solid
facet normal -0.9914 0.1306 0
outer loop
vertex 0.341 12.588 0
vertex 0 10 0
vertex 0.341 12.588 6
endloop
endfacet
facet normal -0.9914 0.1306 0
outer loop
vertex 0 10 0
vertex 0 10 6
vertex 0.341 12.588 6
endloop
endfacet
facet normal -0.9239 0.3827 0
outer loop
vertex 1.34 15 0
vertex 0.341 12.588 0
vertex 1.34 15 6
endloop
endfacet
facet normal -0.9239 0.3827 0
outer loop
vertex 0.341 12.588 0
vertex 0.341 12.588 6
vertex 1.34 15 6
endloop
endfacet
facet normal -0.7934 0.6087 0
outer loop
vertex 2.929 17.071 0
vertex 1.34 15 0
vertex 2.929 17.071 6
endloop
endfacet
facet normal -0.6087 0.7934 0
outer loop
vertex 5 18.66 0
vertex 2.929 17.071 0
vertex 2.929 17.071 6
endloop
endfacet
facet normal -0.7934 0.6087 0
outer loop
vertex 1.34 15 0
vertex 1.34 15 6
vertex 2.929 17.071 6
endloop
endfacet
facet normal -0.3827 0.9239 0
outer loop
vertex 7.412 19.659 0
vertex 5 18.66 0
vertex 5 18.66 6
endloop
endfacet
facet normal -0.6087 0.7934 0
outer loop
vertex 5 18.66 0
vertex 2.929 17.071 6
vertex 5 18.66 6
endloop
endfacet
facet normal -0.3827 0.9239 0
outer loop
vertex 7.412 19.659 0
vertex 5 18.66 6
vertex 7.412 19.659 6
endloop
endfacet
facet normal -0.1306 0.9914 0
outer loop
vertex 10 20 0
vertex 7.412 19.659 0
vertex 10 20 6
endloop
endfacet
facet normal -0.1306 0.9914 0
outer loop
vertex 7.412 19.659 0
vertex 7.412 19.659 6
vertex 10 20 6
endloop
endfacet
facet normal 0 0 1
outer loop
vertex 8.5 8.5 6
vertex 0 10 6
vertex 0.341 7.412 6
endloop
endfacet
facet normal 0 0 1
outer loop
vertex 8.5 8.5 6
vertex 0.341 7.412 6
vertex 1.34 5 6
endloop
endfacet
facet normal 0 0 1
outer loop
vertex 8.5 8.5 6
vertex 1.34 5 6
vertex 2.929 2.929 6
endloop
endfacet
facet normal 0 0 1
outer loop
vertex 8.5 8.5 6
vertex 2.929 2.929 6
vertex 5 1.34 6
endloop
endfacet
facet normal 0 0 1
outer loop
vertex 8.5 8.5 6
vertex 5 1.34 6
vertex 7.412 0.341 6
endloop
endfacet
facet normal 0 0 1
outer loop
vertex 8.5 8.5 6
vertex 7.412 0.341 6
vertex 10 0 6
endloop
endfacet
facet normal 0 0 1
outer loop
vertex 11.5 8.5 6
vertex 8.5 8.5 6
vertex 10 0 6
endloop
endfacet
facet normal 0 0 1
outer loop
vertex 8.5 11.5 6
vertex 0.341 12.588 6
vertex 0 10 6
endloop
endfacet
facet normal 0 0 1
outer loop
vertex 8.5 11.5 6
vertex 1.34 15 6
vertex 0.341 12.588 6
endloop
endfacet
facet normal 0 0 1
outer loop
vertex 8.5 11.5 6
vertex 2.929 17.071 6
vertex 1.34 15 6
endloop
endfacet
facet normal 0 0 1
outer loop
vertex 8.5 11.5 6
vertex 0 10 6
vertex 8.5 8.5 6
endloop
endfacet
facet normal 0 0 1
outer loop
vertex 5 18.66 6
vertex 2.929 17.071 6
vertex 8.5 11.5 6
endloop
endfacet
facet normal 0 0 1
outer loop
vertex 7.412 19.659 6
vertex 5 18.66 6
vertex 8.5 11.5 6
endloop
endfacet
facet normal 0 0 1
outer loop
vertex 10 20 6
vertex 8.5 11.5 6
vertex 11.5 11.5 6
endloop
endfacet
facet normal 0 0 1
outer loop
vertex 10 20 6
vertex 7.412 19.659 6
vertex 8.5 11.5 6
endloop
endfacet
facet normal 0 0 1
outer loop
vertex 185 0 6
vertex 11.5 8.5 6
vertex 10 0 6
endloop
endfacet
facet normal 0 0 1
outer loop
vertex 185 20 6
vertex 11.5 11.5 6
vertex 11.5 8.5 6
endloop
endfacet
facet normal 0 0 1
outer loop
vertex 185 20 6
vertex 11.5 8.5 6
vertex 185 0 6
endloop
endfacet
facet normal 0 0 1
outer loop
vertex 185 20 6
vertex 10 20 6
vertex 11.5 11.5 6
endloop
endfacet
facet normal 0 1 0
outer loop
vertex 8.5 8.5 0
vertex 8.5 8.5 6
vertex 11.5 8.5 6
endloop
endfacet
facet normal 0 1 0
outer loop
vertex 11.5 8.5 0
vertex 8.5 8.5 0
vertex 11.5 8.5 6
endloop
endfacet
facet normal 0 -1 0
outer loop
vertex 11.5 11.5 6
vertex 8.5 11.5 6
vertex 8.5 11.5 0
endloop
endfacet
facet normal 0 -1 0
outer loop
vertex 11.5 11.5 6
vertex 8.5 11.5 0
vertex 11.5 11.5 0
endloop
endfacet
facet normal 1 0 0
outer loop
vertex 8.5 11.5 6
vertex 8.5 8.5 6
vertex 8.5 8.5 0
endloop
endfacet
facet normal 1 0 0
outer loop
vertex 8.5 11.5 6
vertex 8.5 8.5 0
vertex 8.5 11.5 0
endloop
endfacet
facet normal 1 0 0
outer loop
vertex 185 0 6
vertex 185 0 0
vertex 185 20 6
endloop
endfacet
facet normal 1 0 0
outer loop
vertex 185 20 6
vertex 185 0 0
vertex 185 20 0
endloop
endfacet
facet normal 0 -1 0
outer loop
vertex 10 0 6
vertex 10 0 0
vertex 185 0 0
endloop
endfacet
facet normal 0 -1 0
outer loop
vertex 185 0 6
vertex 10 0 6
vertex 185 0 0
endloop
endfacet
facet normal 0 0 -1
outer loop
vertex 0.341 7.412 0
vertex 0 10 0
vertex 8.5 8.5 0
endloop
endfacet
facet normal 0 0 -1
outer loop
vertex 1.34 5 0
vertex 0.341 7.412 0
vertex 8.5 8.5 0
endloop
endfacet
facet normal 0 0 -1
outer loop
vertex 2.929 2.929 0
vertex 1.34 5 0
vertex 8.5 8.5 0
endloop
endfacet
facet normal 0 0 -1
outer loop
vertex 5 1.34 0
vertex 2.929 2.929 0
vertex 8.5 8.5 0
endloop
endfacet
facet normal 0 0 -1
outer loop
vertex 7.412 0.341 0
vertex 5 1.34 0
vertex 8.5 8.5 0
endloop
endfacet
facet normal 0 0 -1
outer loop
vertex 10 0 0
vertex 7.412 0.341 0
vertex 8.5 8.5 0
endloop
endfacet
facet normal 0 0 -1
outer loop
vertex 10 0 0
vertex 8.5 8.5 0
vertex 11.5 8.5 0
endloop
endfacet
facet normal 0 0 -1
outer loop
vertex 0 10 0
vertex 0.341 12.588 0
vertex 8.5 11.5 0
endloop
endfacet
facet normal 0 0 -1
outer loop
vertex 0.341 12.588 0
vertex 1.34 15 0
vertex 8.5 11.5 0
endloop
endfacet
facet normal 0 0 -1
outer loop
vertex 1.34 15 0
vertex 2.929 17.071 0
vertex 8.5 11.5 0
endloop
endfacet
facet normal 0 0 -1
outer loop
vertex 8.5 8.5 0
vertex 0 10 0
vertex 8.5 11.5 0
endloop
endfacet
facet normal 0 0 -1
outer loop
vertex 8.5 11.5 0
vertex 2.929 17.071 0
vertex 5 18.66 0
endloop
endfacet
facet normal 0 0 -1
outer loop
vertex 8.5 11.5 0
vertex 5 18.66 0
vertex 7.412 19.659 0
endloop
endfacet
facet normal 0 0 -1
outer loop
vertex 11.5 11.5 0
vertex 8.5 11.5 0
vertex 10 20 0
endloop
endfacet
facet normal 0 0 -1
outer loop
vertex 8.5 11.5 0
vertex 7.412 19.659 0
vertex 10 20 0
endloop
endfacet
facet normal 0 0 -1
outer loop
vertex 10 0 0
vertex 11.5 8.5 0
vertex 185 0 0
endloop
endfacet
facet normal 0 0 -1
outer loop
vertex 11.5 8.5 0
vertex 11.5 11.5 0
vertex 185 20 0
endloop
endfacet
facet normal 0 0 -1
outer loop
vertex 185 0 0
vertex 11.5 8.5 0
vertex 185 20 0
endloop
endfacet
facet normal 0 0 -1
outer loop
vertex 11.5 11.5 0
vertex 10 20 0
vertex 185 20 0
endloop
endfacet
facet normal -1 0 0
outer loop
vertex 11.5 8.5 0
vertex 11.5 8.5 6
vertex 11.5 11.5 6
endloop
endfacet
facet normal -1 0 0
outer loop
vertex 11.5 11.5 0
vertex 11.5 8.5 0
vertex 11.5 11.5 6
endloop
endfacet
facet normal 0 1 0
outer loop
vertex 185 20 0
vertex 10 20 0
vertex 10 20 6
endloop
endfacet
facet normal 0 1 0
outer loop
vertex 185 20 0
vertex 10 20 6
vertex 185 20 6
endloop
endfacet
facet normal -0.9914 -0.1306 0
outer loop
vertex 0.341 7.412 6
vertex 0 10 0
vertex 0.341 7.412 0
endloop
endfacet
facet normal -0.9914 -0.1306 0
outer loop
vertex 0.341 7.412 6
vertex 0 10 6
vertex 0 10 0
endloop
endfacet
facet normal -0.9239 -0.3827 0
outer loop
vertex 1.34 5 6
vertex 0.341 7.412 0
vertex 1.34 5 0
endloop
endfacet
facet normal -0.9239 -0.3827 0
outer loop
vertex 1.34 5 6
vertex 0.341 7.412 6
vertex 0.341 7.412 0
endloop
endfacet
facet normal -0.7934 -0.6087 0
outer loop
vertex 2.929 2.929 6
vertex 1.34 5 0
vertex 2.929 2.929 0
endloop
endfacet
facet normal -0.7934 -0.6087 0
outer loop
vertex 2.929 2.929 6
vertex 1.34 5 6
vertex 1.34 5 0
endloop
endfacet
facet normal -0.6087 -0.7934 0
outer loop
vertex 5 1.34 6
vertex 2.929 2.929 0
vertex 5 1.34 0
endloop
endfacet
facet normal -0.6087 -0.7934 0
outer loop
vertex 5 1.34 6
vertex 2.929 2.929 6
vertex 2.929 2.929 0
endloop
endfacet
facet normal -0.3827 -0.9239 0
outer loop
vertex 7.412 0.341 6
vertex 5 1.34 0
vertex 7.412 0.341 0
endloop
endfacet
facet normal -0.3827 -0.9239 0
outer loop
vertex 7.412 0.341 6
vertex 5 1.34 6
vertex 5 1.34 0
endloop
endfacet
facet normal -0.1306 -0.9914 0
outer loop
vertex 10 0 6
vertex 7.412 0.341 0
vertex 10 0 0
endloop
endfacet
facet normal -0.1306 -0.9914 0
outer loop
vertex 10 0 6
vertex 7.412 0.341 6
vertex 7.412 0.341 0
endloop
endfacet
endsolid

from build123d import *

# Parameters (mm, degrees)
SKETCH1_W           = 185
SKETCH1_H           = 20
BOSS_EXTRUDE1_DEPTH = 6
SKETCH2_W           = 3
SKETCH2_H           = 3
CUT_EXTRUDE2_DEPTH  = 187.174649187
FILLET1_R           = 10


with BuildPart() as part:
    # Sketch1 → Boss-Extrude1 (new body)
    with BuildSketch(Plane.XY):
        with Locations((92.5, 10)):
            Rectangle(SKETCH1_W, SKETCH1_H)
    extrude(amount=BOSS_EXTRUDE1_DEPTH)

    # Sketch2 → Cut-Extrude2 (cut, through all)
    with BuildSketch(Plane.XY.offset(6)):
        with Locations((10, 10)):
            Rectangle(SKETCH2_W, SKETCH2_H)
    extrude(amount=-CUT_EXTRUDE2_DEPTH, mode=Mode.SUBTRACT)

    # Fillet1
    fillet1_edges = [part.edges().sort_by_distance(p)[0] for p in [
        (0, 0, 3),
        (0, 20, 3),
    ]]
    fillet(fillet1_edges, radius=FILLET1_R - 0.0001)  # a hair under: the kernel refuses the full size


solid = part.part
